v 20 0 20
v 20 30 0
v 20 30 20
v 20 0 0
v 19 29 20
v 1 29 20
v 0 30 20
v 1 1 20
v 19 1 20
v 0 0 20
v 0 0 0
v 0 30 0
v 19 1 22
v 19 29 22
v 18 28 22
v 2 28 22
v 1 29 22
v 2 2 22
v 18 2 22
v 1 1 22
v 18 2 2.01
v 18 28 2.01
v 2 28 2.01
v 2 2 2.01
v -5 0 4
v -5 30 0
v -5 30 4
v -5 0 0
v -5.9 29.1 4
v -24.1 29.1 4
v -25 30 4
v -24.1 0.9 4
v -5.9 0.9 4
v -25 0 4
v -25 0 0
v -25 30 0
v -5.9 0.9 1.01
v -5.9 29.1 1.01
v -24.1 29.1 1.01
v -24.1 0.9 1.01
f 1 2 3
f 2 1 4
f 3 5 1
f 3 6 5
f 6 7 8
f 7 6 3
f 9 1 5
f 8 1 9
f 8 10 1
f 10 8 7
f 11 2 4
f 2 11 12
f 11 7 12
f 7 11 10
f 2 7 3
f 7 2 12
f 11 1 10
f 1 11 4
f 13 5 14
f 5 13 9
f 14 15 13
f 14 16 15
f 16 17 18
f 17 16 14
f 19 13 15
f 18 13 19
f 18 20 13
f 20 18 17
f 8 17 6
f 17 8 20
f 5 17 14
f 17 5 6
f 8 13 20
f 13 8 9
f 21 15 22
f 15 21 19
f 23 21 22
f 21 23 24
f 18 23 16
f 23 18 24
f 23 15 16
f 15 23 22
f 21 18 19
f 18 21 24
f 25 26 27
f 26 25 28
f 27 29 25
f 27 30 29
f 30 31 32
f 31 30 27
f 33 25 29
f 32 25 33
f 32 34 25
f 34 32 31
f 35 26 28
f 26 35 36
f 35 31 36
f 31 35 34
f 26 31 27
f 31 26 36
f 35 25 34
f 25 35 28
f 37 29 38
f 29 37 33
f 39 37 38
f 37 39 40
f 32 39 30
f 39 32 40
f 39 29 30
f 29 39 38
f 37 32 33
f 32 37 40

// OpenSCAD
x = 20;
y = 30;
z = 20;

edge = 2;
lipw = edge/2;
liph = 2;
sep = 5;
tol = 0.2;

epsilon = 0.01;

difference() 
    {
        union()
        {   
            translate(v=[0,0,0]) 
                {
                    cube(size=[x,y,z], center=false);
                }
            translate(v=[lipw,lipw,0]) 
                {
                    cube(size=[x-edge,y-edge,z+liph], center=false);
                }
        }
        translate(v=[edge,edge,edge+epsilon]) 
            {
                cube(size=[x-(edge*2),y-(edge*2),z-edge+liph], center=false);
            }
    }

difference()
    {
         translate(v=[-(x+sep),0,0]) 
                {
                    cube(size=[x,y,liph+edge], center=false);
                }
         translate(v=[-(x+sep-lipw+(tol/2)),edge-(lipw+(tol/2)),lipw+epsilon]) 
            {
                cube(size=[x+tol-(lipw*2),y-(lipw*2)+tol,lipw+liph], center=false);
            }
        }
